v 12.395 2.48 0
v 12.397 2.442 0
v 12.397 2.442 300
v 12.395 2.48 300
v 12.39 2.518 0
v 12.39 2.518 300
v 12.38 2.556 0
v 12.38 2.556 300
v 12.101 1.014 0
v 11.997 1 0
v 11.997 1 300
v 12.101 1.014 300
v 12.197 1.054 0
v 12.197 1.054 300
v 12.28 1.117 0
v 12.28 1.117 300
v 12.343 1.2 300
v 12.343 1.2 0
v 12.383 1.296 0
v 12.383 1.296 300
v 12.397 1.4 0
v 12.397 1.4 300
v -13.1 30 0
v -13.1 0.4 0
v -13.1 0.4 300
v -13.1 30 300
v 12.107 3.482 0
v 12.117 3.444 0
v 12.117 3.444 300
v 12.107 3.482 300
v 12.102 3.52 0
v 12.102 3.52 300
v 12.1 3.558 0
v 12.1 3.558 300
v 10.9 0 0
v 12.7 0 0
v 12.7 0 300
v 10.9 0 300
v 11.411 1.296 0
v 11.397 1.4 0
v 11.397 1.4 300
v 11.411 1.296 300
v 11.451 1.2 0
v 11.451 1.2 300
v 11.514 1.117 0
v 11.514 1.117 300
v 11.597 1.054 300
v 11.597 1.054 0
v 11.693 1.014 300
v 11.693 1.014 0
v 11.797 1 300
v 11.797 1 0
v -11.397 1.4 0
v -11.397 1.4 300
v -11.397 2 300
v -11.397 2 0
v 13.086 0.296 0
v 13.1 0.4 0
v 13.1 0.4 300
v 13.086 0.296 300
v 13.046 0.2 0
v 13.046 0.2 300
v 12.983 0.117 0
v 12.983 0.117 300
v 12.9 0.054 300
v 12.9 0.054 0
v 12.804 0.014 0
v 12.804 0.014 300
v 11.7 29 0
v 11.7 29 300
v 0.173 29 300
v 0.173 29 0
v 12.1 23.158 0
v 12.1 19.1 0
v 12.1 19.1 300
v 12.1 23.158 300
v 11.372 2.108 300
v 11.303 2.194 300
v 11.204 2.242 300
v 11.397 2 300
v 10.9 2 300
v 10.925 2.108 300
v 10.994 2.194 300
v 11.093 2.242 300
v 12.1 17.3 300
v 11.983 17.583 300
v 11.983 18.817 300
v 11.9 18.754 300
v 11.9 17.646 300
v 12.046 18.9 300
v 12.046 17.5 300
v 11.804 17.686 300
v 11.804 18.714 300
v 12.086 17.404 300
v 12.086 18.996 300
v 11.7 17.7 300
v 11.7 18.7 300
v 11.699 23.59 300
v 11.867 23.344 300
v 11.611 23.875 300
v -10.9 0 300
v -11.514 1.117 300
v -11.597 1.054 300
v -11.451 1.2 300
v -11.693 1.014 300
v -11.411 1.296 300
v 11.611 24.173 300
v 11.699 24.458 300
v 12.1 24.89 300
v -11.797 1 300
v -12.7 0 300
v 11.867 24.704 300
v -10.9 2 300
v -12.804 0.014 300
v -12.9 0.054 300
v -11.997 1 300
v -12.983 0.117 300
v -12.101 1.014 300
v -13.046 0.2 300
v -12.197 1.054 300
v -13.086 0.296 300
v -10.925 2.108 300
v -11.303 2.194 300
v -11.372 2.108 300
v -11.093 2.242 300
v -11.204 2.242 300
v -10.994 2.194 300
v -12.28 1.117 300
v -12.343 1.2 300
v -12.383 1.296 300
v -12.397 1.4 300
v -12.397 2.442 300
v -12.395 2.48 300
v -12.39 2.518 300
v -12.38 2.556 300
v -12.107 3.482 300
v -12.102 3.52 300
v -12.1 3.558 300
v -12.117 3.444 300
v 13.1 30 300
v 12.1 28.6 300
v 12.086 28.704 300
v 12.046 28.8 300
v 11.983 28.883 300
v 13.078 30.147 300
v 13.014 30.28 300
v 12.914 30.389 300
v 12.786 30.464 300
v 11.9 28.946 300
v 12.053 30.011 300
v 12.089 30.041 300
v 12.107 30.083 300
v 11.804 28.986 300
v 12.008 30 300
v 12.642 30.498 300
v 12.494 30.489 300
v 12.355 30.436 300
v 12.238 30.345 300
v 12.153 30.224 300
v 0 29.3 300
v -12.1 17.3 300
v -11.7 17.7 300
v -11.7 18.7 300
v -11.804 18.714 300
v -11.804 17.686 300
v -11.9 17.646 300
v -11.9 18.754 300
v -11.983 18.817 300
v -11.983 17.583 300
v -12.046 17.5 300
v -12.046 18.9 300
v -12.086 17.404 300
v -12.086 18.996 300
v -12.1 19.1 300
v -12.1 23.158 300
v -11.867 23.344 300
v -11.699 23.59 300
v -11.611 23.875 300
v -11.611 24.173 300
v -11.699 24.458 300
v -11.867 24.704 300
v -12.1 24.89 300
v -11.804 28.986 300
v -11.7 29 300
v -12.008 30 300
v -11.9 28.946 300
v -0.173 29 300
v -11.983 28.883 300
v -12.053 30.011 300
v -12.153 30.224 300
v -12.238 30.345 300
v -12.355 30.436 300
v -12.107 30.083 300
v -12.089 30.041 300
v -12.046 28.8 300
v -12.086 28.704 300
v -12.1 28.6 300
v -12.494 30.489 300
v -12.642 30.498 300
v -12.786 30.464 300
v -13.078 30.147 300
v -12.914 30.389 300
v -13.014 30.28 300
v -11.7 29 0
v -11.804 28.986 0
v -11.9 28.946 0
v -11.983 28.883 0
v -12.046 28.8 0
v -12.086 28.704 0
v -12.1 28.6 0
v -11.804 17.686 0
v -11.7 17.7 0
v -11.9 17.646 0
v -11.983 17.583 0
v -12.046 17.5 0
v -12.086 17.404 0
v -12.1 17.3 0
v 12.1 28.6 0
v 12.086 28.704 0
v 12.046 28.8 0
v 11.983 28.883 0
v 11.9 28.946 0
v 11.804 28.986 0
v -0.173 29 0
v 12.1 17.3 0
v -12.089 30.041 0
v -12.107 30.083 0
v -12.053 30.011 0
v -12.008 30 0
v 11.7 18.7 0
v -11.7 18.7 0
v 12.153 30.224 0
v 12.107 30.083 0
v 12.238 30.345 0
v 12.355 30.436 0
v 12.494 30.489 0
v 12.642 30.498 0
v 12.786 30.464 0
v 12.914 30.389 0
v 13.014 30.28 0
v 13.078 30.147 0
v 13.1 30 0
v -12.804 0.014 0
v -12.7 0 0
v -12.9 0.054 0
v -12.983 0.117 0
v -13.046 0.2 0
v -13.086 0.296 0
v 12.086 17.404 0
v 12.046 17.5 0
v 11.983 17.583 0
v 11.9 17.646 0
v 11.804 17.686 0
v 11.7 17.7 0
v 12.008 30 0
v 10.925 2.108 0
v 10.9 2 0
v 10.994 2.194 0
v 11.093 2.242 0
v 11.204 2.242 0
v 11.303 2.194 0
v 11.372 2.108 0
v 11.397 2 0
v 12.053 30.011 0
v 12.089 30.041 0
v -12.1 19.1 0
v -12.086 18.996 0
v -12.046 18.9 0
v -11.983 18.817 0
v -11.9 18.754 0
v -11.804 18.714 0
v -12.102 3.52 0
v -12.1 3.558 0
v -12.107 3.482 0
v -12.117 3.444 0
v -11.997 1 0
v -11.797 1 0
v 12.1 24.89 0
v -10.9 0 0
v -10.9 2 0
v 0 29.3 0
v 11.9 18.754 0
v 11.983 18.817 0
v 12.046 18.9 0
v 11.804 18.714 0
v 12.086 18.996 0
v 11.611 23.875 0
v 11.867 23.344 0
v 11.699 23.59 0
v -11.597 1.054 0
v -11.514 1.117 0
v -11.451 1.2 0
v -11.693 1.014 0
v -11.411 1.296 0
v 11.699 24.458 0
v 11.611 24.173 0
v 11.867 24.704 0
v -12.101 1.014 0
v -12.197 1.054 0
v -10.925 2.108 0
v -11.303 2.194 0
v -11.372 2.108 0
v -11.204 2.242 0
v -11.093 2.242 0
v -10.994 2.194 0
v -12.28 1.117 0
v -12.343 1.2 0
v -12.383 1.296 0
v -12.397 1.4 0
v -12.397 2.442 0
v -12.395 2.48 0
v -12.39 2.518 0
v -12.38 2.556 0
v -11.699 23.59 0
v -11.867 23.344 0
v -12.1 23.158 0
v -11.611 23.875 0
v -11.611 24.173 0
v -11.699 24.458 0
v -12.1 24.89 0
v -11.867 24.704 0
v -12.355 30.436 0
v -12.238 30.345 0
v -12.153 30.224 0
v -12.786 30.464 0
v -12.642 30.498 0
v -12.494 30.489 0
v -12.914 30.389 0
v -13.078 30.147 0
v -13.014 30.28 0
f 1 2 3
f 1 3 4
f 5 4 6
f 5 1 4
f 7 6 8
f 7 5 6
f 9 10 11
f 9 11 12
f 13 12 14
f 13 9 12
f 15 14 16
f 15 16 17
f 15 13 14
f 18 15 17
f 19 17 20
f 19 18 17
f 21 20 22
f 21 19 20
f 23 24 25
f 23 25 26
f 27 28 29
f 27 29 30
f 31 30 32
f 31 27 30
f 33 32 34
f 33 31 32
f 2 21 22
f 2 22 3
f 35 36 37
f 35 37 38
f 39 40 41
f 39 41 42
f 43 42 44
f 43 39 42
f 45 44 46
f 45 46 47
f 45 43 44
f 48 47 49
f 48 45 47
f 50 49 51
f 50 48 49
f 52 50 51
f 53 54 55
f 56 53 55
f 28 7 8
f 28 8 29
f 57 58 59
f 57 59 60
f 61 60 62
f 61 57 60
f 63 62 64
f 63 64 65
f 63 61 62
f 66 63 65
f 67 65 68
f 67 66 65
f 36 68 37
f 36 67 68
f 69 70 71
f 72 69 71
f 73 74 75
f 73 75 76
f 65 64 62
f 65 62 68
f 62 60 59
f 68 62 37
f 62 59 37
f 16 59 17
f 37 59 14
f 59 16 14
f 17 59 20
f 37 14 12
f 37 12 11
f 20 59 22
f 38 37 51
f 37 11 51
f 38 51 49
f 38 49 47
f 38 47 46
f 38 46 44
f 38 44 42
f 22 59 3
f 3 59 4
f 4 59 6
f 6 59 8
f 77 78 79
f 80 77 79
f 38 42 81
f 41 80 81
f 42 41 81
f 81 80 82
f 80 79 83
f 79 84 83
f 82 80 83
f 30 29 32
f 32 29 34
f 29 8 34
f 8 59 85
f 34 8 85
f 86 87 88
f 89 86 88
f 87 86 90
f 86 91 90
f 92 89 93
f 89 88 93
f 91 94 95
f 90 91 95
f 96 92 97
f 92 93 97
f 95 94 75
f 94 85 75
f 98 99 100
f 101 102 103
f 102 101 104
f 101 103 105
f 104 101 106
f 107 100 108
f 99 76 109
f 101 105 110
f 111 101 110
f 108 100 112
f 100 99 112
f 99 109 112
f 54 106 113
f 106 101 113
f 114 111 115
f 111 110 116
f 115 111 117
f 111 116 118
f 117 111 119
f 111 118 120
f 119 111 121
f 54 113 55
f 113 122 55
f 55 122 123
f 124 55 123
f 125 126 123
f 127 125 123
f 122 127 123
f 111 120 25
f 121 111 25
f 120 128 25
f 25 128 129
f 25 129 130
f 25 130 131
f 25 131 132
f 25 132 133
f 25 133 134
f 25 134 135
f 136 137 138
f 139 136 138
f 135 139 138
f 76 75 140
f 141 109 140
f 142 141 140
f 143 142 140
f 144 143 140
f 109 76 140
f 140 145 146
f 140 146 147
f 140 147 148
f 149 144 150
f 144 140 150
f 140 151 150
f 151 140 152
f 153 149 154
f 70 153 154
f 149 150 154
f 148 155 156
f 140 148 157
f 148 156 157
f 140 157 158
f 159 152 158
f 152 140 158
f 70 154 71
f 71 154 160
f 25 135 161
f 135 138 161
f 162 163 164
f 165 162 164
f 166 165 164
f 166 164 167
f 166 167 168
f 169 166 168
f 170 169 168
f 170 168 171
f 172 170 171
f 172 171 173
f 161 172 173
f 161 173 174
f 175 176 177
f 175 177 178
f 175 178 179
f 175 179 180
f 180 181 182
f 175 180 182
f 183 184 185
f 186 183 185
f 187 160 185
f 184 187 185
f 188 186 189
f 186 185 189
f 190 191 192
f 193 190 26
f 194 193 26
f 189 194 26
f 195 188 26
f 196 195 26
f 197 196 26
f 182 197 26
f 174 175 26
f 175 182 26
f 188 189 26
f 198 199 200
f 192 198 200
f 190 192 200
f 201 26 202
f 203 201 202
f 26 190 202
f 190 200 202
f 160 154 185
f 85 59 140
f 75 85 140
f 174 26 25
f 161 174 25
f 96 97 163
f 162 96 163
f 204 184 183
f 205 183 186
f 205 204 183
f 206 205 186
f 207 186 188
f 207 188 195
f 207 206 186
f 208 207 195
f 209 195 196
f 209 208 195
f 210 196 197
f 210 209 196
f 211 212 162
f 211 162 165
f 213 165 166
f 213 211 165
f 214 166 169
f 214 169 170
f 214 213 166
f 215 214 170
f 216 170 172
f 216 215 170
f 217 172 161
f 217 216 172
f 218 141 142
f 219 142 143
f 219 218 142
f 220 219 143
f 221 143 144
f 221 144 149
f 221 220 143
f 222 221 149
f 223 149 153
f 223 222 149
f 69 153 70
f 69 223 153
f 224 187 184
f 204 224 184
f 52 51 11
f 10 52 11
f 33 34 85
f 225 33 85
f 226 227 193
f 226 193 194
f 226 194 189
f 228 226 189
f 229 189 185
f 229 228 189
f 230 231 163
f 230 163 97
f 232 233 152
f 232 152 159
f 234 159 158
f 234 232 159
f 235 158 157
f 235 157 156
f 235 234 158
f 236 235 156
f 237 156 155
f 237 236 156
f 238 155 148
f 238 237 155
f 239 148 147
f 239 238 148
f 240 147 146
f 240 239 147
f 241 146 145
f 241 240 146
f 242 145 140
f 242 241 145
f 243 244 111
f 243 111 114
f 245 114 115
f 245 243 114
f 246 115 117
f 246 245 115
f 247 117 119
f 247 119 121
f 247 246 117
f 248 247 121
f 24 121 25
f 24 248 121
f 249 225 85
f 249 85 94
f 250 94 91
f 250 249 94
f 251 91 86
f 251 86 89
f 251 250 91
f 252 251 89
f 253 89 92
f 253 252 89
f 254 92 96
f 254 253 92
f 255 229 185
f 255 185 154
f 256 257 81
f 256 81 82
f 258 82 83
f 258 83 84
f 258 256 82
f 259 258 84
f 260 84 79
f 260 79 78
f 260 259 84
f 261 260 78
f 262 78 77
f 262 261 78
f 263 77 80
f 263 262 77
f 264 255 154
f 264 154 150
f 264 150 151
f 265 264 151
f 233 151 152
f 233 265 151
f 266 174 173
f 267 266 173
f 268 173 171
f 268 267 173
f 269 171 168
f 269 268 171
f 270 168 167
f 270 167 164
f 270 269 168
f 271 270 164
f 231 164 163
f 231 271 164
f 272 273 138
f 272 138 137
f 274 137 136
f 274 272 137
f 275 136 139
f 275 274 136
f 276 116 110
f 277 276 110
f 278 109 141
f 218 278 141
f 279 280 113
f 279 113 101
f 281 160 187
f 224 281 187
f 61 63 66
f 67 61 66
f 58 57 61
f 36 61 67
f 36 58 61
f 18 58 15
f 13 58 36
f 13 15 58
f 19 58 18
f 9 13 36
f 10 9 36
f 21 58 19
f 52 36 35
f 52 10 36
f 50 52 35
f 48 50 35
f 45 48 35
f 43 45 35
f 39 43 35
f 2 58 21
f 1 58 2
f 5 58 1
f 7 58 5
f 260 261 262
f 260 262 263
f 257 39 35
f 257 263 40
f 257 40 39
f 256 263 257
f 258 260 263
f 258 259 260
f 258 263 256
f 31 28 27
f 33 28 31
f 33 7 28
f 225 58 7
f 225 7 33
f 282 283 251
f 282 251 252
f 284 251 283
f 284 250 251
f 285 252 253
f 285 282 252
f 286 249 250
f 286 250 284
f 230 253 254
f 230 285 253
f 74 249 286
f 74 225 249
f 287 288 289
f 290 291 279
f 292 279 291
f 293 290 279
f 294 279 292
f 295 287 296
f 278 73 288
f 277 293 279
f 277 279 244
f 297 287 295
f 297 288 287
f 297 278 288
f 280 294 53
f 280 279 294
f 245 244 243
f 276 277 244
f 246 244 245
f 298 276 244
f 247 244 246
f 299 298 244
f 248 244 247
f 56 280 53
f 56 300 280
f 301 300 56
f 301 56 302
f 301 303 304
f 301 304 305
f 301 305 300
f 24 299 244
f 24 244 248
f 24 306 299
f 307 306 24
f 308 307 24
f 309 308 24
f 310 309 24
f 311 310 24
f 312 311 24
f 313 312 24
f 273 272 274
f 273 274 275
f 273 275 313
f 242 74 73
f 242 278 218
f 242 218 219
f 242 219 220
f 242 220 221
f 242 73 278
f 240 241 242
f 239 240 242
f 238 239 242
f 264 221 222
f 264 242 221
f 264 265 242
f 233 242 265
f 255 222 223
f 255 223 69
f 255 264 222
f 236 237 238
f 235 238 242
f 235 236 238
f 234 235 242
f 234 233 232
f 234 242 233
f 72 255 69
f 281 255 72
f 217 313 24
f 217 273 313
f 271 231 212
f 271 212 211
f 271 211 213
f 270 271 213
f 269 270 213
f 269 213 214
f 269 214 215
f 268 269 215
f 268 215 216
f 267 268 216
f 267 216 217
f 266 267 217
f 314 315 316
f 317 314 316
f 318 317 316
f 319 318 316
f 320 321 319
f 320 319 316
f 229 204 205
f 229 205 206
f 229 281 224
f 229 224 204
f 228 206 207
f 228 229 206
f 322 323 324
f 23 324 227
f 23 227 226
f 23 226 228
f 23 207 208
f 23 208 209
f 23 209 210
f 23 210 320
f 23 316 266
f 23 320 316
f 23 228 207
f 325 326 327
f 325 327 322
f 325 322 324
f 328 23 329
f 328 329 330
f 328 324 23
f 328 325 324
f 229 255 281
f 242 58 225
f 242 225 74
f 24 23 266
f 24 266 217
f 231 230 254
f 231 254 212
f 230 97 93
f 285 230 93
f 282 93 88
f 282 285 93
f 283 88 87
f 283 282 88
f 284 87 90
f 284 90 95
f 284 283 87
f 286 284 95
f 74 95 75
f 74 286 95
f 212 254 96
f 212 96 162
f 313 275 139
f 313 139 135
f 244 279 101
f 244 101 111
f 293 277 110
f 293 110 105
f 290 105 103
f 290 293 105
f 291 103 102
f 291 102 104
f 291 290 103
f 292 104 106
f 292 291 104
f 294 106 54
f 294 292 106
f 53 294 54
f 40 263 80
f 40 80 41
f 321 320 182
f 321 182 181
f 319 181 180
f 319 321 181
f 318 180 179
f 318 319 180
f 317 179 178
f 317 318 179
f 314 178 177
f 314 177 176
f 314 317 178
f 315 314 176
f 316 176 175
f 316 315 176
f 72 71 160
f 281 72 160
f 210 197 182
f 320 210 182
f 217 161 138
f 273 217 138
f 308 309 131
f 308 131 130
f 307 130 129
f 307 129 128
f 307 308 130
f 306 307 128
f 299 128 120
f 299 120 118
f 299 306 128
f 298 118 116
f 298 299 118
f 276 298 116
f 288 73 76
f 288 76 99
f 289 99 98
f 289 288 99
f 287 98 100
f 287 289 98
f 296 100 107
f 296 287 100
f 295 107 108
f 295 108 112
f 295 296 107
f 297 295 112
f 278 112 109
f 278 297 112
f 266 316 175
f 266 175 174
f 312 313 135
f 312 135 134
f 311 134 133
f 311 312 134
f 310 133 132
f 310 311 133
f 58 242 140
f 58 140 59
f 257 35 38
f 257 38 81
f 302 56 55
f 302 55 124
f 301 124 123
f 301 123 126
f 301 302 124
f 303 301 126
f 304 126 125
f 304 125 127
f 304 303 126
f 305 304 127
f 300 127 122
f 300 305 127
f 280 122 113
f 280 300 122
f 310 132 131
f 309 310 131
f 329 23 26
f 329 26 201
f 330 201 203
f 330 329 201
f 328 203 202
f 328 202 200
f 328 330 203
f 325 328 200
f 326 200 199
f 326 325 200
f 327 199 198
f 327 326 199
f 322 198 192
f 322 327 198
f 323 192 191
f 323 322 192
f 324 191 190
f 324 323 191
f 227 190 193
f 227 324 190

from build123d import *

# Parameters (mm, degrees)
BOSS_EXTRUDE1_DEPTH = 300


with BuildPart() as part:
    # Sketch1 → Boss-Extrude1 (new body)
    with BuildSketch(Plane.XY):
        with BuildLine():
            Line((-12.008392022, 30), (12.008392022, 30))
            ThreePointArc((12.008392022, 30), (12.072941744, 30.023623738), (12.106993351, 30.083333333))
            ThreePointArc((12.106993351, 30.083333333), (12.64181313, 30.498248595), (13.1, 30))
            Line((13.1, 30), (13.1, 17.7))
            Line((13.1, 17.7), (13.1, 0.4))
            ThreePointArc((13.1, 0.4), (12.982842712, 0.117157288), (12.7, 0))
            Line((12.7, 0), (10.9, 0))
            Line((10.9, 0), (10.9, 2))
            ThreePointArc((10.9, 2), (11.148496927, 2.248496927), (11.396993855, 2))
            Line((11.396993855, 2), (11.396993855, 1.4))
            ThreePointArc((11.396993855, 1.4), (11.514151142, 1.117157288), (11.796993855, 1))
            Line((11.796993855, 1), (11.996993855, 1))
            ThreePointArc((11.996993855, 1), (12.279836567, 1.117157288), (12.396993855, 1.4))
            Line((12.396993855, 1.4), (12.396993855, 2.441856285))
            ThreePointArc((12.396993855, 2.441856285), (12.3928338, 2.499395297), (12.380440165, 2.555737483))
            Line((12.380440165, 2.555737483), (12.11655369, 3.444262517))
            ThreePointArc((12.11655369, 3.444262517), (12.104160055, 3.500604703), (12.1, 3.558143715))
            Line((12.1, 3.558143715), (12.1, 17.3))
            ThreePointArc((12.1, 17.3), (11.982842712, 17.582842712), (11.7, 17.7))
            Line((11.7, 17.7), (-11.7, 17.7))
            ThreePointArc((-11.7, 17.7), (-11.982842712, 17.582842712), (-12.1, 17.3))
            Line((-12.1, 17.3), (-12.1, 3.558143715))
            ThreePointArc((-12.1, 3.558143715), (-12.104160055, 3.500604703), (-12.11655369, 3.444262517))
            Line((-12.11655369, 3.444262517), (-12.380440165, 2.555737483))
            ThreePointArc((-12.380440165, 2.555737483), (-12.3928338, 2.499395297), (-12.396993855, 2.441856285))
            Line((-12.396993855, 2.441856285), (-12.396993855, 1.4))
            ThreePointArc((-12.396993855, 1.4), (-12.279836567, 1.117157288), (-11.996993855, 1))
            Line((-11.996993855, 1), (-11.796993855, 1))
            ThreePointArc((-11.796993855, 1), (-11.514151142, 1.117157288), (-11.396993855, 1.4))
            Line((-11.396993855, 1.4), (-11.396993855, 2))
            ThreePointArc((-11.396993855, 2), (-11.148496927, 2.248496927), (-10.9, 2))
            Line((-10.9, 2), (-10.9, 0))
            Line((-10.9, 0), (-12.7, 0))
            ThreePointArc((-12.7, 0), (-12.982842712, 0.117157288), (-13.1, 0.4))
            Line((-13.1, 0.4), (-13.1, 17.7))
            Line((-13.1, 17.7), (-13.1, 30))
            ThreePointArc((-13.1, 30), (-12.64181313, 30.498248595), (-12.106993351, 30.083333333))
            ThreePointArc((-12.106993351, 30.083333333), (-12.072941744, 30.023623738), (-12.008392022, 30))
        make_face()
        with BuildLine():
            Line((-12.1, 28.6), (-12.1, 24.889865053))
            ThreePointArc((-12.1, 24.889865053), (-11.6, 24.02383965), (-12.1, 23.157814246))
            Line((-12.1, 23.157814246), (-12.1, 19.1))
            ThreePointArc((-12.1, 19.1), (-11.982842712, 18.817157288), (-11.7, 18.7))
            Line((-11.7, 18.7), (11.7, 18.7))
            ThreePointArc((11.7, 18.7), (11.982842712, 18.817157288), (12.1, 19.1))
            Line((12.1, 19.1), (12.1, 23.157814246))
            ThreePointArc((12.1, 23.157814246), (11.6, 24.02383965), (12.1, 24.889865053))
            Line((12.1, 24.889865053), (12.1, 28.6))
            ThreePointArc((12.1, 28.6), (11.982842712, 28.882842712), (11.7, 29))
            Line((11.7, 29), (0.173205081, 29))
            Line((0.173205081, 29), (0, 29.3))
            Line((0, 29.3), (-0.173205081, 29))
            Line((-0.173205081, 29), (-11.7, 29))
            ThreePointArc((-11.7, 29), (-11.982842712, 28.882842712), (-12.1, 28.6))
        make_face(mode=Mode.SUBTRACT)
    extrude(amount=BOSS_EXTRUDE1_DEPTH)


solid = part.part
